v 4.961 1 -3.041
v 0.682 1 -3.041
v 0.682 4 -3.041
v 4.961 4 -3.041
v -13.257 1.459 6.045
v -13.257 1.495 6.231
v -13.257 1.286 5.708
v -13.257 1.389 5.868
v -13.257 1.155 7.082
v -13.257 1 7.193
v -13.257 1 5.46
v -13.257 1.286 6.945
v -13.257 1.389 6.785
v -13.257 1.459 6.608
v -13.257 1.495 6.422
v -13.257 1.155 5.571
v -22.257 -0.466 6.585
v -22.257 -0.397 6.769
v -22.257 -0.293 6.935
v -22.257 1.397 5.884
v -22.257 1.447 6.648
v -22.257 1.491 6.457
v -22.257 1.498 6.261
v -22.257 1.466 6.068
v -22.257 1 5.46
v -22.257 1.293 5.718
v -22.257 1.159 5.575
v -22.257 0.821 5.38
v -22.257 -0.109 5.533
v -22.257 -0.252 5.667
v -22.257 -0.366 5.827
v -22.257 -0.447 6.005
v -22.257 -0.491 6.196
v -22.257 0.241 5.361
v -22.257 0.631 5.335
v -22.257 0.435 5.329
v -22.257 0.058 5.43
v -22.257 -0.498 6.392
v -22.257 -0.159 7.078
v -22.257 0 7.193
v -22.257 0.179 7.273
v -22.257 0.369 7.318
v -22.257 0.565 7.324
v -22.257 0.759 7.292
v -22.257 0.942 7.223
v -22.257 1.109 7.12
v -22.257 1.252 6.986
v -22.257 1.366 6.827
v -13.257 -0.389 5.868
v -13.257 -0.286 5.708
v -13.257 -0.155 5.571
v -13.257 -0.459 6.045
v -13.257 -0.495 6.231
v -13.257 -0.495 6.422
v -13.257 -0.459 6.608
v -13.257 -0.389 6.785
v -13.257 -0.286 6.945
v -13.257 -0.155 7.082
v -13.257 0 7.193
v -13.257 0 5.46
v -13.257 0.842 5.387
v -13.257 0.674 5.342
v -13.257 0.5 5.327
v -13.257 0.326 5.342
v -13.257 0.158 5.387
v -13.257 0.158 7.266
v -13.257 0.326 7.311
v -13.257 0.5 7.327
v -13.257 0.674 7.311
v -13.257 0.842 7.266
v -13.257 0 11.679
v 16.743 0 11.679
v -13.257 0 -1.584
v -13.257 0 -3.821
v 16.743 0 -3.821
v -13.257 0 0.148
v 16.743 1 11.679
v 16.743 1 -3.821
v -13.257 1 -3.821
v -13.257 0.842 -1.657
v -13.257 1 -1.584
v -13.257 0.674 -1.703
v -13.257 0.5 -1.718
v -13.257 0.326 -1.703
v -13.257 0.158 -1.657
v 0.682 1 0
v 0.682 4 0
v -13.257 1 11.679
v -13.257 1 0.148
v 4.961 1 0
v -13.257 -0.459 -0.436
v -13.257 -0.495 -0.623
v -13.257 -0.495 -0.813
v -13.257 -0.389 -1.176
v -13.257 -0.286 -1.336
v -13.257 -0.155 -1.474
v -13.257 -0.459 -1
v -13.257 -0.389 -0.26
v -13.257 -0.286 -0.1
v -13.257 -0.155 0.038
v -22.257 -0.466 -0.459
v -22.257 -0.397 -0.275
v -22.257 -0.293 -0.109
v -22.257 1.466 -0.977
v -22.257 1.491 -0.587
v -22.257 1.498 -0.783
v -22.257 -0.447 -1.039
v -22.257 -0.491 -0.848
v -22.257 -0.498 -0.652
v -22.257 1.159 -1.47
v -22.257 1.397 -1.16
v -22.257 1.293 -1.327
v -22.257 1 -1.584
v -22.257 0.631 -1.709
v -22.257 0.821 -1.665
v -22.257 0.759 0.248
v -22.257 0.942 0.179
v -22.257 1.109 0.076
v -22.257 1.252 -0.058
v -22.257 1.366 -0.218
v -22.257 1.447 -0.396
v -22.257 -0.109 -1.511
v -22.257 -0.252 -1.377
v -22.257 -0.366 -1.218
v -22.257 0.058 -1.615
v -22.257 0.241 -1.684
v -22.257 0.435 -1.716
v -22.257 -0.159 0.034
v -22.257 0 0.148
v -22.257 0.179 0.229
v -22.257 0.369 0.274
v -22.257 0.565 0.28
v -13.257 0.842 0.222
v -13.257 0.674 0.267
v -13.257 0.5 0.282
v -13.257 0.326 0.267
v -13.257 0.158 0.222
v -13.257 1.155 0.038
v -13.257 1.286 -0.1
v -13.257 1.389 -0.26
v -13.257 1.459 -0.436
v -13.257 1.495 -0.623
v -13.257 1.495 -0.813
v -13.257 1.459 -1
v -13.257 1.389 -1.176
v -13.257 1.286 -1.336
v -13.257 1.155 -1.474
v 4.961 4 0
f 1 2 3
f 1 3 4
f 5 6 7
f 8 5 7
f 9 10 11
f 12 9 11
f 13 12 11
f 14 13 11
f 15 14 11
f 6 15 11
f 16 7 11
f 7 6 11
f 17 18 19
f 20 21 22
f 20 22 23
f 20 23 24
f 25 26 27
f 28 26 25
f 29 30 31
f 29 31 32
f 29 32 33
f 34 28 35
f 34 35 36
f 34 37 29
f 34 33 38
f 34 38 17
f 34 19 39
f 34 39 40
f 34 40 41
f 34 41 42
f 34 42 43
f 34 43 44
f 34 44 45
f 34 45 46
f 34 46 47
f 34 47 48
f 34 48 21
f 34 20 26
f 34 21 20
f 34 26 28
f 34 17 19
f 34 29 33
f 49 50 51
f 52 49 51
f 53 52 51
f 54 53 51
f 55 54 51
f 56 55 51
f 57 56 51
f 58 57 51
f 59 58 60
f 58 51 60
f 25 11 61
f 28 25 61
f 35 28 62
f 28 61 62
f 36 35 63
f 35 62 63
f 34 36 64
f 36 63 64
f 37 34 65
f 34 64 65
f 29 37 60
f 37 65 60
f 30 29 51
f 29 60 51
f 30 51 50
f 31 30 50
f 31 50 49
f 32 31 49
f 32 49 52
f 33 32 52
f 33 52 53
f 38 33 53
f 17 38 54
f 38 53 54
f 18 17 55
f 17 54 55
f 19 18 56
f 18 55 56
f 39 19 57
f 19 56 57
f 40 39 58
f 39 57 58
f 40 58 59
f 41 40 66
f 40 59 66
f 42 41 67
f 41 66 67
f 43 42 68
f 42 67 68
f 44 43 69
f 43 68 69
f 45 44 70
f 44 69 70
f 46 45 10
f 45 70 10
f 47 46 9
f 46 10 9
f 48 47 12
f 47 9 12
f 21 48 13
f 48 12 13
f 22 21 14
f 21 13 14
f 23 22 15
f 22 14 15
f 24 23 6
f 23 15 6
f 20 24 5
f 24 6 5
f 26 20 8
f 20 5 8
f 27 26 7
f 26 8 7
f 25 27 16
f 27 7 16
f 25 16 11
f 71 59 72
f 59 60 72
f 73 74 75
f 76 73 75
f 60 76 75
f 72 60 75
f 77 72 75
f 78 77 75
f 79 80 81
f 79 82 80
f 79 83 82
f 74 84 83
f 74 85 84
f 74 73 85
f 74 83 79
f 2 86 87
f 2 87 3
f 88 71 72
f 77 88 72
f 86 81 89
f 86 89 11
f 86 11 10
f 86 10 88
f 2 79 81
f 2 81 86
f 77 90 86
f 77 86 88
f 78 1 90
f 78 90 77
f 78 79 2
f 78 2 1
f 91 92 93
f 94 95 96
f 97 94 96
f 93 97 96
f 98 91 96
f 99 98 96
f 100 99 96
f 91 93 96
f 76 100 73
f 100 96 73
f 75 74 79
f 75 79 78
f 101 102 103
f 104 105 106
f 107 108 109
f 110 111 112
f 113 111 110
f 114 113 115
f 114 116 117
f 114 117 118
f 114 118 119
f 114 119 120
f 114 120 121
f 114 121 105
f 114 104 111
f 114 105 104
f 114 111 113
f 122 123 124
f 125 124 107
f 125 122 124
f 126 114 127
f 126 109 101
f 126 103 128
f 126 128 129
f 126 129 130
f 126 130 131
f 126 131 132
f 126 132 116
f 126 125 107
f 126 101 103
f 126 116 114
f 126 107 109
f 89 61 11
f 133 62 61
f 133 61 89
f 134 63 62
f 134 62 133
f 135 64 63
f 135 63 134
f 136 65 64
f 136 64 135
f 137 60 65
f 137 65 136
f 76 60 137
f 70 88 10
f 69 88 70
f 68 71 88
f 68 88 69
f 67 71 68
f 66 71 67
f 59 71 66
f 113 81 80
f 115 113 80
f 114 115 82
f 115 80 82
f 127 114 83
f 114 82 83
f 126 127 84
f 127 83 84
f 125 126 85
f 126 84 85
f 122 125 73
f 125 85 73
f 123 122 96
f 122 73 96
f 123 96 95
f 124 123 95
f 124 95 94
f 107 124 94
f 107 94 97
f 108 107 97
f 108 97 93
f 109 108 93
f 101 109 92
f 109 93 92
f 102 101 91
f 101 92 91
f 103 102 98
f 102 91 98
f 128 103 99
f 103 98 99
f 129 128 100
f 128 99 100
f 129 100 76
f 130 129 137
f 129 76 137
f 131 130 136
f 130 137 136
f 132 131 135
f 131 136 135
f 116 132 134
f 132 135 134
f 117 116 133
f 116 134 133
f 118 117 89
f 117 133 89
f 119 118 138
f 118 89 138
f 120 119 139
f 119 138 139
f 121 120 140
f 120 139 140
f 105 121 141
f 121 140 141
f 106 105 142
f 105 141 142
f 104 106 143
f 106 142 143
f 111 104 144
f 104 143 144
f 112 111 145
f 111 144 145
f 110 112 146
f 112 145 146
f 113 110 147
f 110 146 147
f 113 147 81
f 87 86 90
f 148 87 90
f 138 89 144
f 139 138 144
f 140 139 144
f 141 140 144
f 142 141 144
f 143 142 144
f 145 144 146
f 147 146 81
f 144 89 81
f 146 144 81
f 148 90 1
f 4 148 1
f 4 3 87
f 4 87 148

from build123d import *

# Parameters (mm, degrees)
SKETCH1_W           = 30
SKETCH1_H           = 15.5
BOSS_EXTRUDE1_DEPTH = 1
SKETCH2_R           = 1
BOSS_EXTRUDE2_DEPTH = 9
SKETCH3_W           = 4.279397372
SKETCH3_H           = 3.040773008
BOSS_EXTRUDE3_DEPTH = 3


with BuildPart() as part:
    # Sketch1 → Boss-Extrude1 (new body)
    with BuildSketch(Plane(origin=(0, 0, 0), x_dir=(1, 0, 0), z_dir=(0, 1, 0))):
        with Locations((1.743407461, -3.928718986)):
            Rectangle(SKETCH1_W, SKETCH1_H)
    extrude(amount=BOSS_EXTRUDE1_DEPTH)

    # Sketch2 → Boss-Extrude2 (add)
    with BuildSketch(Plane.ZY.offset(13.256592539)):
        with Locations(Location((-0.717776519, 0.5, 0), (0, 0, 150))):
            Circle(SKETCH2_R)
        with Locations(Location((6.326509059, 0.5, 0), (0, 0, 150))):
            Circle(SKETCH2_R)
    extrude(amount=BOSS_EXTRUDE2_DEPTH)

    # Sketch3 → Boss-Extrude3 (add)
    with BuildSketch(Plane(origin=(0, 1, 0), x_dir=(1, 0, 0), z_dir=(0, 1, 0))):
        with Locations((2.821431472, 1.520386504)):
            Rectangle(SKETCH3_W, SKETCH3_H)
    extrude(amount=BOSS_EXTRUDE3_DEPTH)


solid = part.part
